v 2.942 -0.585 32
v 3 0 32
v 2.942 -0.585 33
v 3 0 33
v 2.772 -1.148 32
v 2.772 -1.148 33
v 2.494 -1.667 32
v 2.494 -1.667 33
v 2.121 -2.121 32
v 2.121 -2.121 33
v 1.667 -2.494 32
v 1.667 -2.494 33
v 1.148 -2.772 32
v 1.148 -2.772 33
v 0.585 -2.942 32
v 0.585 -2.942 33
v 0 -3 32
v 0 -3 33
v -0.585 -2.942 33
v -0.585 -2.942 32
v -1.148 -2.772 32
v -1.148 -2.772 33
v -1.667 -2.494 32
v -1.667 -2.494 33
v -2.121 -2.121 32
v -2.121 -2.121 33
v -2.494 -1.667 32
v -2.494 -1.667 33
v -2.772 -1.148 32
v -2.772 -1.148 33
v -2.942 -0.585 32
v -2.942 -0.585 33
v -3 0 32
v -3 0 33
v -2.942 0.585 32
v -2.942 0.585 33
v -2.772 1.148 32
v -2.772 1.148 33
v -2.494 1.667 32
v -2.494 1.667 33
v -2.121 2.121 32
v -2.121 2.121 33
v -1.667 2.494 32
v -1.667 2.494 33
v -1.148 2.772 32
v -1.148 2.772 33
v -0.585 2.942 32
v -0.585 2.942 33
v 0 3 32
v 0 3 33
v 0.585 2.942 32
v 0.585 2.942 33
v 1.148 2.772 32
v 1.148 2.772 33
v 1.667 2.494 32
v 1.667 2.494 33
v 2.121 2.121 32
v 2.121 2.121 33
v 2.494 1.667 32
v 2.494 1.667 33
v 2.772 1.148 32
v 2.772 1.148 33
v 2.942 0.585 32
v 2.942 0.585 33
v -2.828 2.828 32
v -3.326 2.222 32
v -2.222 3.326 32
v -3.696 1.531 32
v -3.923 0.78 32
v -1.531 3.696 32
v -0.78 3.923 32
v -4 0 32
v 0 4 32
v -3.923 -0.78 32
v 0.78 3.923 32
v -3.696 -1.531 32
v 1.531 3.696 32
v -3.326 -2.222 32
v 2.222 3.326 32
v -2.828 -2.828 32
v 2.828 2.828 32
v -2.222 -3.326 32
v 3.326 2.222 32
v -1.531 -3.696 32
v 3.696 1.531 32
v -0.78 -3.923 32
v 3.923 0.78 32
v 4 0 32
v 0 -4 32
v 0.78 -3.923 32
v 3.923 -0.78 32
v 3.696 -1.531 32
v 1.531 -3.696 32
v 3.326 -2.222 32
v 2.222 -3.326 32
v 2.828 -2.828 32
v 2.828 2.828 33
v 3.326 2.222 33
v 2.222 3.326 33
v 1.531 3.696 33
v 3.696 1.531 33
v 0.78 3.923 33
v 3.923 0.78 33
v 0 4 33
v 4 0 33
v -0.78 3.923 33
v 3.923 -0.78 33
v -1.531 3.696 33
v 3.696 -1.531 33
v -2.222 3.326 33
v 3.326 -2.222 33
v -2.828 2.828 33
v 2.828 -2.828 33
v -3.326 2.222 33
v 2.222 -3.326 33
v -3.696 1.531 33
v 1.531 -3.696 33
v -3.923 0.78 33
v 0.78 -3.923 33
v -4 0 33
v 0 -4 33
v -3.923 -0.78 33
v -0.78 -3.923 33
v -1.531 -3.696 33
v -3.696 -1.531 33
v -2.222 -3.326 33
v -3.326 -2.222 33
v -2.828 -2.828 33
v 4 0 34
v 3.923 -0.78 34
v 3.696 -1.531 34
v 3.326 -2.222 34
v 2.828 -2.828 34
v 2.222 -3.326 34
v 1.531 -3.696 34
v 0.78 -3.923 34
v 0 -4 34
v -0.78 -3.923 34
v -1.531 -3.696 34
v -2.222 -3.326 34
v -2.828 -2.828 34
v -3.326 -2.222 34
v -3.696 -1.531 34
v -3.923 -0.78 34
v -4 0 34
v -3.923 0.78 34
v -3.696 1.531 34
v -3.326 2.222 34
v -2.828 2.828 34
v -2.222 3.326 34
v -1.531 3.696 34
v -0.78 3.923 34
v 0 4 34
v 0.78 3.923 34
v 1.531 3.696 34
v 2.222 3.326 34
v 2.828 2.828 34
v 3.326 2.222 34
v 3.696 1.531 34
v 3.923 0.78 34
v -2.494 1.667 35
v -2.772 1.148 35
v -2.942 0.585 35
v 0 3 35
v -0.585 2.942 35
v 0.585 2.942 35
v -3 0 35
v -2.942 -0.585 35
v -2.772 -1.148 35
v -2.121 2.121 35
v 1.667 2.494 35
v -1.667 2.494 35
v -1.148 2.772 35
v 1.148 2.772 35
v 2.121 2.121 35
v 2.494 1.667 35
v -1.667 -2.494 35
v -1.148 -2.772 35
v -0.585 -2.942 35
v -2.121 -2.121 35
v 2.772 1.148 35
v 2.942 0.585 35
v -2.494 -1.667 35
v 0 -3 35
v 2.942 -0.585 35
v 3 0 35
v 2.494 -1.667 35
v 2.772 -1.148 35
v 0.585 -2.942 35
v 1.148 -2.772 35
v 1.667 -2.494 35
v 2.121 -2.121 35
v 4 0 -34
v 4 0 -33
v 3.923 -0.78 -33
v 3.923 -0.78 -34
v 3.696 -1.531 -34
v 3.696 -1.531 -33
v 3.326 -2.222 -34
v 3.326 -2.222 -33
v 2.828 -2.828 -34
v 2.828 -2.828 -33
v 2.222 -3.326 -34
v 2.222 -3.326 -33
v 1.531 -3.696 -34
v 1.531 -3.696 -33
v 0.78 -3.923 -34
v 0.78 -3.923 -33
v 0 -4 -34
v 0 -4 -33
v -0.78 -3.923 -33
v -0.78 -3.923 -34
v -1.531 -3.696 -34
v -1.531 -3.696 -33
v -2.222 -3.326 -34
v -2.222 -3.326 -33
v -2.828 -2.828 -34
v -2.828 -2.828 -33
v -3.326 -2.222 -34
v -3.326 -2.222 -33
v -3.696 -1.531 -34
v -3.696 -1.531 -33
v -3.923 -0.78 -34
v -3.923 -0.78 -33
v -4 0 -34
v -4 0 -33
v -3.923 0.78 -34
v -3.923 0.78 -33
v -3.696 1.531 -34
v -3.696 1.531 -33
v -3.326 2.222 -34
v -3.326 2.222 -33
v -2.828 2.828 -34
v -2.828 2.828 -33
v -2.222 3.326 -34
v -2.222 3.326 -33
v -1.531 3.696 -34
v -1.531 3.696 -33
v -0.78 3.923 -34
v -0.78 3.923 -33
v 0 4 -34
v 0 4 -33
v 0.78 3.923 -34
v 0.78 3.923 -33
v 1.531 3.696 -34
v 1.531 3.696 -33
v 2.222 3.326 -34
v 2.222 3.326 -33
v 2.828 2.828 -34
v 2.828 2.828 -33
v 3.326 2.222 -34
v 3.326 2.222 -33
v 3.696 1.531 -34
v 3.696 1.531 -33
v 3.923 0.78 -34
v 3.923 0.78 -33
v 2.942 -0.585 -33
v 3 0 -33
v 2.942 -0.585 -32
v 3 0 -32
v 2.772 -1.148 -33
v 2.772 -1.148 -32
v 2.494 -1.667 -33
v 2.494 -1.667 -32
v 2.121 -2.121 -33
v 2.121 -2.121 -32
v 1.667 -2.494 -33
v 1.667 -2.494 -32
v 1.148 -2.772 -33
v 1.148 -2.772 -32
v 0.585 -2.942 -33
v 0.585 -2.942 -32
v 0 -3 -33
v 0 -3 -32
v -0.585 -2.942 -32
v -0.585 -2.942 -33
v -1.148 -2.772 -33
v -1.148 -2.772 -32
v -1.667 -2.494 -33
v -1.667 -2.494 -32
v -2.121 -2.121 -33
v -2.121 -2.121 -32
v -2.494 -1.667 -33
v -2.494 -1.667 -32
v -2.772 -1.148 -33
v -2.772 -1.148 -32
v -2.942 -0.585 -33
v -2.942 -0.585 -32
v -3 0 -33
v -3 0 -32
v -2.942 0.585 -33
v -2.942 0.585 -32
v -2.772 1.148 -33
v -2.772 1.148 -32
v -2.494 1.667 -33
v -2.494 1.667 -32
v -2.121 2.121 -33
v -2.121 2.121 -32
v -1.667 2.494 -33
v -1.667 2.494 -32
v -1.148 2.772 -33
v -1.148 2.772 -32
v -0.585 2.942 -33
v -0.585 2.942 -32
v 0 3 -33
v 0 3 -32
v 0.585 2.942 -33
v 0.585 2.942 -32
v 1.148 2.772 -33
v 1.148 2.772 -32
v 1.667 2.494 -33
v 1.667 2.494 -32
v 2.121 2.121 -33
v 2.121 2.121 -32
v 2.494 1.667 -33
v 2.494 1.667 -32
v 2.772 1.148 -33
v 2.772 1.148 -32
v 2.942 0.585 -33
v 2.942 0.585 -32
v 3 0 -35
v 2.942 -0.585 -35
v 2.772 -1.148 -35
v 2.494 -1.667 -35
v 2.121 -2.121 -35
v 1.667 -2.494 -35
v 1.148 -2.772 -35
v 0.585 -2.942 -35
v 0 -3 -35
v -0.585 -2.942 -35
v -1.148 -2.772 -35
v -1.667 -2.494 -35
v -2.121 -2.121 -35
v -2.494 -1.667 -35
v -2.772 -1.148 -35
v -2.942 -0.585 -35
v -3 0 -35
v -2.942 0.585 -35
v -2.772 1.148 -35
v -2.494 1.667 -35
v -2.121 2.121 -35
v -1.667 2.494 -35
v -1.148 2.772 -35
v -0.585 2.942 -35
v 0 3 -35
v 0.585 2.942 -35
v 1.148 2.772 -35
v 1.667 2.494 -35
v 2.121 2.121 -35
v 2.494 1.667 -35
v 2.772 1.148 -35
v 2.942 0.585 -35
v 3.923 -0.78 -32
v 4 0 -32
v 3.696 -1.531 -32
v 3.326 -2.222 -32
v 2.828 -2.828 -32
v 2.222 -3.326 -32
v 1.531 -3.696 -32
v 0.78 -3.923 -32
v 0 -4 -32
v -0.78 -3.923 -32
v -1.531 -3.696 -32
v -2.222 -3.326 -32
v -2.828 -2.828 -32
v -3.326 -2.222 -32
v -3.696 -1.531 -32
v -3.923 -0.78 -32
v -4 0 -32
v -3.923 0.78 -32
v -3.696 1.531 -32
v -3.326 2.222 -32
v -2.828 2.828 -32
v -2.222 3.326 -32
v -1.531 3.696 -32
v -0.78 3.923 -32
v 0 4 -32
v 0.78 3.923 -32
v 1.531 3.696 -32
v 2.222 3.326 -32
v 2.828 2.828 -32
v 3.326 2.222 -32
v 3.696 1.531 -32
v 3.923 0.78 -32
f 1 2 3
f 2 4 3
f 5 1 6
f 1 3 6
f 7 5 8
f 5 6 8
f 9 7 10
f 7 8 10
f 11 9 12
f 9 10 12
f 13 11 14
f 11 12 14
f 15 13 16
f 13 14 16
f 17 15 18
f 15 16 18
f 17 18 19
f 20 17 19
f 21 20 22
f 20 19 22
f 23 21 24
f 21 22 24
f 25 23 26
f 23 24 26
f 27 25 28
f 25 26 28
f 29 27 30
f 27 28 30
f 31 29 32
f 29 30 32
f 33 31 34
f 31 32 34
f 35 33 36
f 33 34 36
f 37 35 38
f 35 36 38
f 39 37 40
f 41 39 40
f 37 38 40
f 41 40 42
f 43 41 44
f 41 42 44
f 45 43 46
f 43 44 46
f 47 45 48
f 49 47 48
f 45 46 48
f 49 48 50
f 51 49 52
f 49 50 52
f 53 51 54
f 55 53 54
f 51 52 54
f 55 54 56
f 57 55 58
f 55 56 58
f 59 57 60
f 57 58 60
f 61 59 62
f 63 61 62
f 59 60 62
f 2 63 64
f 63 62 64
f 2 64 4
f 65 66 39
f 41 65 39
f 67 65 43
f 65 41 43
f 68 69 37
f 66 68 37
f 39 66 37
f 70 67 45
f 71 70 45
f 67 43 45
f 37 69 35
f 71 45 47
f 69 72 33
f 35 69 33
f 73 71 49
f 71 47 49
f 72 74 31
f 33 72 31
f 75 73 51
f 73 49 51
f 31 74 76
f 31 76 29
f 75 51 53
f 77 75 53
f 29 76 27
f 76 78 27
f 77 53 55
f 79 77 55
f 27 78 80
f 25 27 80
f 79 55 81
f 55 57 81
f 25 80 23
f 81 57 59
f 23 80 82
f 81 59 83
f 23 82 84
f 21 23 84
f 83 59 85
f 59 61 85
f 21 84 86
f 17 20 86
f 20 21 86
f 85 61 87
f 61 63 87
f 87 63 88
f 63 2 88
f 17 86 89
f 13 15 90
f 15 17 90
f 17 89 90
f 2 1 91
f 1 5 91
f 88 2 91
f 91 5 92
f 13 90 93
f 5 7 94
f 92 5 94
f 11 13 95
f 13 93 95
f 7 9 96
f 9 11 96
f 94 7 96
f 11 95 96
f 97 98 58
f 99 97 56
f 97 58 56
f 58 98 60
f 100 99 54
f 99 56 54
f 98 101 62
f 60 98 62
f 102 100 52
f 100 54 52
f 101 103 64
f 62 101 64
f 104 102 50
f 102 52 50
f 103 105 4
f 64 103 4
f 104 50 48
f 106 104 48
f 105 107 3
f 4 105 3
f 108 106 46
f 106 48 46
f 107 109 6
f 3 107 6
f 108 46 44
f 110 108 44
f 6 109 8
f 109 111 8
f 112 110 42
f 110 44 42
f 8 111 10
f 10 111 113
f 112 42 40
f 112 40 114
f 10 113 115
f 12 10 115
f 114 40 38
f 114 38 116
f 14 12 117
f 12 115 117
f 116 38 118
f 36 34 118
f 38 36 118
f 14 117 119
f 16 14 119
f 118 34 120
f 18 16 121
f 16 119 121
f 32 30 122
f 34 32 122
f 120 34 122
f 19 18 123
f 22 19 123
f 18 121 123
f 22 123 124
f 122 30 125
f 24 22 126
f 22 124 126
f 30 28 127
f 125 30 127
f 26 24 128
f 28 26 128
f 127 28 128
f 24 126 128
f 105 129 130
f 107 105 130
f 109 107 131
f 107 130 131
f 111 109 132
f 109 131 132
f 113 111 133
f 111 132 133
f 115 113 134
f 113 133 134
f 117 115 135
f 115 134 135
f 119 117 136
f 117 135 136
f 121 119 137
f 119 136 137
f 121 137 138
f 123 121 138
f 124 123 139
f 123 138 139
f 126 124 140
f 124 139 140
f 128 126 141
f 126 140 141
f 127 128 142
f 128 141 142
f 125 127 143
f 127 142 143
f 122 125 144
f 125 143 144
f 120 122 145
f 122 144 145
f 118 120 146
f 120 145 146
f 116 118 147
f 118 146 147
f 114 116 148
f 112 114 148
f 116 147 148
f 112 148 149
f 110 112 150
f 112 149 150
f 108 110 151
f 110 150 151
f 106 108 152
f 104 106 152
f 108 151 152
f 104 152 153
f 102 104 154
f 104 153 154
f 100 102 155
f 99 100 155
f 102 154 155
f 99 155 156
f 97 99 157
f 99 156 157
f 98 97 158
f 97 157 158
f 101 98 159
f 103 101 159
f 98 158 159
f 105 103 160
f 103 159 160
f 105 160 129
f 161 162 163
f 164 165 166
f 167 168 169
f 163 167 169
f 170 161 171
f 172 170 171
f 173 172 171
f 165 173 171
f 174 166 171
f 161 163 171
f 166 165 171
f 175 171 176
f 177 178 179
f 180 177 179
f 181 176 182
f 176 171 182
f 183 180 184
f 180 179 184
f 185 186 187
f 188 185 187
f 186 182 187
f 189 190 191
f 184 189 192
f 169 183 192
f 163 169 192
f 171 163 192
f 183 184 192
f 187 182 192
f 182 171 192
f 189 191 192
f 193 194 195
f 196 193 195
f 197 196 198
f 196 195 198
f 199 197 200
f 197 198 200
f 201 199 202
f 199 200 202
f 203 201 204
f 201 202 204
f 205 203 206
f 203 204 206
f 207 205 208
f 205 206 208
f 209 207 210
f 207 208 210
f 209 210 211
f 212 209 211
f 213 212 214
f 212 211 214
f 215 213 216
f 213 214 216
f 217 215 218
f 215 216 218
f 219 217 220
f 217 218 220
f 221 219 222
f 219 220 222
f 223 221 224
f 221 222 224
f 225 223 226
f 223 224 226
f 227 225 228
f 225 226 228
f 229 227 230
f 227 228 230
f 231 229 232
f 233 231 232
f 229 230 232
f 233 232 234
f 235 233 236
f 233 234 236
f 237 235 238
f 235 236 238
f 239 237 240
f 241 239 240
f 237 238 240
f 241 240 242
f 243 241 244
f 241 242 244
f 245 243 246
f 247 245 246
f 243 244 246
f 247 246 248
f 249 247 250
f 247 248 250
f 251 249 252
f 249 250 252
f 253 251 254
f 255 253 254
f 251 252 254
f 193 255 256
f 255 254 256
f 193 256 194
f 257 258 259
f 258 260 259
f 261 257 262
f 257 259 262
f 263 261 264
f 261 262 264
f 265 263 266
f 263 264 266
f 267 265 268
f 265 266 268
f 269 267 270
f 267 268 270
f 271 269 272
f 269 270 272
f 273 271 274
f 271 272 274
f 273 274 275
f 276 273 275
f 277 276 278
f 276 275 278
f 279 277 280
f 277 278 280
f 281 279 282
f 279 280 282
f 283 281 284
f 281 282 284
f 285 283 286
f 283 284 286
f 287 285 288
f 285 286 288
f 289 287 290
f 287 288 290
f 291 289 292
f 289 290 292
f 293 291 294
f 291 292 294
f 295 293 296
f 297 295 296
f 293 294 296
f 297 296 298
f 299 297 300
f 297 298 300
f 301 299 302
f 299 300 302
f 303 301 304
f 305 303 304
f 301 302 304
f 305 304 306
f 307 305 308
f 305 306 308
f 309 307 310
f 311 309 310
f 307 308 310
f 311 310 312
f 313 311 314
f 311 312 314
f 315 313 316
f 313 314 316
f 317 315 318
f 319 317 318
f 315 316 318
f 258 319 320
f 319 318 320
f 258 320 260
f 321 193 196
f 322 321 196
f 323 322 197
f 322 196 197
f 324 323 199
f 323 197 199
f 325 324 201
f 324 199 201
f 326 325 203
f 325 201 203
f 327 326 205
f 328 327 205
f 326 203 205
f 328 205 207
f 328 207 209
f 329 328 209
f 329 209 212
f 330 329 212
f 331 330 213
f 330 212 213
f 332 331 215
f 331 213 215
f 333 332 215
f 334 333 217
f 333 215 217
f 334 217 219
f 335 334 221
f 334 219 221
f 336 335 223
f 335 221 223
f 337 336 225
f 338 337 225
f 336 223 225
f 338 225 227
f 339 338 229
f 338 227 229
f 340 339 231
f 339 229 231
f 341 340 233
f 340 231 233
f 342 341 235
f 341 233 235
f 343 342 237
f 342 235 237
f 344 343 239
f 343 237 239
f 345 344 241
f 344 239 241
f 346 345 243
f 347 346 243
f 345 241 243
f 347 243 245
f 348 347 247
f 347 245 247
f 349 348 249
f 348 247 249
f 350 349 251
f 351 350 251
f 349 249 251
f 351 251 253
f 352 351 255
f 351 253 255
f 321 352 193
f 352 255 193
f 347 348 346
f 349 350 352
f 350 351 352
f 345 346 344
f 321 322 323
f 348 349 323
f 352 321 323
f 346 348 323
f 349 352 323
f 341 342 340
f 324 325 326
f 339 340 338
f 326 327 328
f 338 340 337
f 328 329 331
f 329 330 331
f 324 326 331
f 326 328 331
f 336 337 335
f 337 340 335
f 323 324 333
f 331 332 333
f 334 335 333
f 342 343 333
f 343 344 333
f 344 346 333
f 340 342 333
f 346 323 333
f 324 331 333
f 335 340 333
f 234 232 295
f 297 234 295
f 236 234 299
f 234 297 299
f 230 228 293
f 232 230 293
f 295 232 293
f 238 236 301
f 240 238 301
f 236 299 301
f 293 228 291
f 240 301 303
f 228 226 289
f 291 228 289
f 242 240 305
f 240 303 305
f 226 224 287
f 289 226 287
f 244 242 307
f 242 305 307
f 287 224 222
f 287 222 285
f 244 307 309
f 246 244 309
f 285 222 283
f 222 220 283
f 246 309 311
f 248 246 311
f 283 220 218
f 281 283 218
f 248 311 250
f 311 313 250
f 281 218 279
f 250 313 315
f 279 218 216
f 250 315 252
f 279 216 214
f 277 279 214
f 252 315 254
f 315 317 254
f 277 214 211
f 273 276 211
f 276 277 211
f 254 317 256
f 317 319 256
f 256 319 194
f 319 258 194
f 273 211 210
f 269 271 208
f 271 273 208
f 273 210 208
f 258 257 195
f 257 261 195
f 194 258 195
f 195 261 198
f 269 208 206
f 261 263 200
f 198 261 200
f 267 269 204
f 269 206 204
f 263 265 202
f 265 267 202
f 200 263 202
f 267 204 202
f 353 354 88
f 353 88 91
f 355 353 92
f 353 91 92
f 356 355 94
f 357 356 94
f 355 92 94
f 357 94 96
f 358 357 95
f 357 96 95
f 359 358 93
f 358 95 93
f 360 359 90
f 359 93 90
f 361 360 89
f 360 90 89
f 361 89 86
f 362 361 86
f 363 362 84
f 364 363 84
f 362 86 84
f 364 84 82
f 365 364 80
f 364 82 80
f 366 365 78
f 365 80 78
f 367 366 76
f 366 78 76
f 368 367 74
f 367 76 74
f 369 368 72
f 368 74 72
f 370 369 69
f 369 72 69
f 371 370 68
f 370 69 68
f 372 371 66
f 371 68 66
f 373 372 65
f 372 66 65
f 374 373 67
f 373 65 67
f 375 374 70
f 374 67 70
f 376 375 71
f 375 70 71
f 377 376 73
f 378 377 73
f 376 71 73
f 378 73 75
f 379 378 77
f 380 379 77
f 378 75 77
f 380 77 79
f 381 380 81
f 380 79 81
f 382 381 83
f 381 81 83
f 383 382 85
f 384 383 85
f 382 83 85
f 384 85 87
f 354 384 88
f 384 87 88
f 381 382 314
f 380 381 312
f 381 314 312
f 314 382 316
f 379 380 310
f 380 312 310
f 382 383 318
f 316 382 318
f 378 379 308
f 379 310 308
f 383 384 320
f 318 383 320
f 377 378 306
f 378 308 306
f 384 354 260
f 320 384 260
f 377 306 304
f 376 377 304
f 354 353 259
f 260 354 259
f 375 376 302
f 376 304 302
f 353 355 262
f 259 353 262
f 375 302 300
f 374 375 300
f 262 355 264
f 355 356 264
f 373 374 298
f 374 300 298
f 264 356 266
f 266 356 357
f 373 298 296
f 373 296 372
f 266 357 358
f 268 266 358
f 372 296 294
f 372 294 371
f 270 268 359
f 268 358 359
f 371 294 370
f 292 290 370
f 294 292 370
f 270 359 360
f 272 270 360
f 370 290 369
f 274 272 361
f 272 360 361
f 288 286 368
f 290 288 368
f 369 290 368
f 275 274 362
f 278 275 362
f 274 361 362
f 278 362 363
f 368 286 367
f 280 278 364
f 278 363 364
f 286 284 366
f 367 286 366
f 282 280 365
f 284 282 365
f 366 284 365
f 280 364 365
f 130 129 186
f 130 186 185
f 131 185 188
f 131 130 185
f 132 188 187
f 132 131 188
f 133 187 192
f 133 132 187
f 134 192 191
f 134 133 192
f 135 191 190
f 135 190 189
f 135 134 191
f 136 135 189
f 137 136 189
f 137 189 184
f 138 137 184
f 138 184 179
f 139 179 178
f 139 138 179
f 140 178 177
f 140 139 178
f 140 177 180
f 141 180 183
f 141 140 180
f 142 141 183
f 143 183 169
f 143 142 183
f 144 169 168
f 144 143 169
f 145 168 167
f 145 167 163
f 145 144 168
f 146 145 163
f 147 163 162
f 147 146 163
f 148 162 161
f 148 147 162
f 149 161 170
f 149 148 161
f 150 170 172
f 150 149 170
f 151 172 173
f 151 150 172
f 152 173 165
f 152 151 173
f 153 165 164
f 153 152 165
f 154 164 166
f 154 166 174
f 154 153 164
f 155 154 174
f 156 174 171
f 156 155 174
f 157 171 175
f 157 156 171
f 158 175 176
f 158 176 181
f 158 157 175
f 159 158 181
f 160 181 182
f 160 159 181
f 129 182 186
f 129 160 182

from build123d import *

# Parameters (mm, degrees)
F2_SIZE2 = 1
F2_SIZE  = 1


with BuildPart() as f1:
    # F0 (on Front) → F1 (revolve)
    with BuildSketch(Plane.XZ):
        Polygon((4, 35), (0, 35), (0, -35), (4, -35), (4, -33), (3, -33), (3, -32), (4, -32), (4, 32), (3, 32), (3, 33), (4, 33), align=None)
    revolve(axis=Axis((0, 0, 0), (0, 0, -1)))

    # F2
    f2_edges = [f1.edges().sort_by_distance(p)[0] for p in [
        (-4, 0, 35),
        (-4, 0, -35),
    ]]
    chamfer(f2_edges, length=F2_SIZE, length2=F2_SIZE2)


solid = f1.part
